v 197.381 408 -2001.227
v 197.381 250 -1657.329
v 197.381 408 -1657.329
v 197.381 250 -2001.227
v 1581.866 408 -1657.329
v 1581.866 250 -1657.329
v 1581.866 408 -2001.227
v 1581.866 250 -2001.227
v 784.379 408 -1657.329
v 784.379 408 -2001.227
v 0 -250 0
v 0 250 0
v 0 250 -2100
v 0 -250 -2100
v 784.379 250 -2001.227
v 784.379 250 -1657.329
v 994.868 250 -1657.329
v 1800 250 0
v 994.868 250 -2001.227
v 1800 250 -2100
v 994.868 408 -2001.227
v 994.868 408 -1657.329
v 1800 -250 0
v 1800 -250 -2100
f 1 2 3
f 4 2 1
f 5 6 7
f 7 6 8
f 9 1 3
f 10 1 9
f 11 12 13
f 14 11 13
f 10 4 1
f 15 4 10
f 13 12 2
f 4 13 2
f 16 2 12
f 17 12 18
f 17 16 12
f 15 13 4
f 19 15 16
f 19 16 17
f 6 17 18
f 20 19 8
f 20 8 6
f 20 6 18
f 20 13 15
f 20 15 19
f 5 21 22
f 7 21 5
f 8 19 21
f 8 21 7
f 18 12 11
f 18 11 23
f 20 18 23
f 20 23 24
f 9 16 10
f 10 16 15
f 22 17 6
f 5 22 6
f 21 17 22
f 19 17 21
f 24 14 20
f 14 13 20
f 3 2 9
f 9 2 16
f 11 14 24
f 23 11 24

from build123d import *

# Parameters (mm, degrees)
SKETCH_1_W      = 1800
SKETCH_1_H      = 2100
EXTRUDE_1_DEPTH = 250
SKETCH_2_W      = 586.997926232
SKETCH_2_H      = 343.897774964
EXTRUDE_2_DEPTH = 158


with BuildPart() as part:
    # Эскиз1 → Бобышка-Вытянуть1 (new, symmetric)
    with BuildSketch(Plane(origin=(0, 0, 0), x_dir=(1, 0, 0), z_dir=(0, 1, 0))):
        with Locations((900, 1050)):
            Rectangle(SKETCH_1_W, SKETCH_1_H)
    extrude(amount=EXTRUDE_1_DEPTH, both=True)

    # Эскиз2 → Бобышка-Вытянуть2 (add)
    with BuildSketch(Plane(origin=(0, 250, 0), x_dir=(1, 0, 0), z_dir=(0, 1, 0))):
        with Locations((490.880233232, 1829.277683609)):
            Rectangle(SKETCH_2_W, SKETCH_2_H)
        with Locations((1288.36731483, 1829.277683609)):
            Rectangle(SKETCH_2_W, SKETCH_2_H)
    extrude(amount=EXTRUDE_2_DEPTH)


solid = part.part
